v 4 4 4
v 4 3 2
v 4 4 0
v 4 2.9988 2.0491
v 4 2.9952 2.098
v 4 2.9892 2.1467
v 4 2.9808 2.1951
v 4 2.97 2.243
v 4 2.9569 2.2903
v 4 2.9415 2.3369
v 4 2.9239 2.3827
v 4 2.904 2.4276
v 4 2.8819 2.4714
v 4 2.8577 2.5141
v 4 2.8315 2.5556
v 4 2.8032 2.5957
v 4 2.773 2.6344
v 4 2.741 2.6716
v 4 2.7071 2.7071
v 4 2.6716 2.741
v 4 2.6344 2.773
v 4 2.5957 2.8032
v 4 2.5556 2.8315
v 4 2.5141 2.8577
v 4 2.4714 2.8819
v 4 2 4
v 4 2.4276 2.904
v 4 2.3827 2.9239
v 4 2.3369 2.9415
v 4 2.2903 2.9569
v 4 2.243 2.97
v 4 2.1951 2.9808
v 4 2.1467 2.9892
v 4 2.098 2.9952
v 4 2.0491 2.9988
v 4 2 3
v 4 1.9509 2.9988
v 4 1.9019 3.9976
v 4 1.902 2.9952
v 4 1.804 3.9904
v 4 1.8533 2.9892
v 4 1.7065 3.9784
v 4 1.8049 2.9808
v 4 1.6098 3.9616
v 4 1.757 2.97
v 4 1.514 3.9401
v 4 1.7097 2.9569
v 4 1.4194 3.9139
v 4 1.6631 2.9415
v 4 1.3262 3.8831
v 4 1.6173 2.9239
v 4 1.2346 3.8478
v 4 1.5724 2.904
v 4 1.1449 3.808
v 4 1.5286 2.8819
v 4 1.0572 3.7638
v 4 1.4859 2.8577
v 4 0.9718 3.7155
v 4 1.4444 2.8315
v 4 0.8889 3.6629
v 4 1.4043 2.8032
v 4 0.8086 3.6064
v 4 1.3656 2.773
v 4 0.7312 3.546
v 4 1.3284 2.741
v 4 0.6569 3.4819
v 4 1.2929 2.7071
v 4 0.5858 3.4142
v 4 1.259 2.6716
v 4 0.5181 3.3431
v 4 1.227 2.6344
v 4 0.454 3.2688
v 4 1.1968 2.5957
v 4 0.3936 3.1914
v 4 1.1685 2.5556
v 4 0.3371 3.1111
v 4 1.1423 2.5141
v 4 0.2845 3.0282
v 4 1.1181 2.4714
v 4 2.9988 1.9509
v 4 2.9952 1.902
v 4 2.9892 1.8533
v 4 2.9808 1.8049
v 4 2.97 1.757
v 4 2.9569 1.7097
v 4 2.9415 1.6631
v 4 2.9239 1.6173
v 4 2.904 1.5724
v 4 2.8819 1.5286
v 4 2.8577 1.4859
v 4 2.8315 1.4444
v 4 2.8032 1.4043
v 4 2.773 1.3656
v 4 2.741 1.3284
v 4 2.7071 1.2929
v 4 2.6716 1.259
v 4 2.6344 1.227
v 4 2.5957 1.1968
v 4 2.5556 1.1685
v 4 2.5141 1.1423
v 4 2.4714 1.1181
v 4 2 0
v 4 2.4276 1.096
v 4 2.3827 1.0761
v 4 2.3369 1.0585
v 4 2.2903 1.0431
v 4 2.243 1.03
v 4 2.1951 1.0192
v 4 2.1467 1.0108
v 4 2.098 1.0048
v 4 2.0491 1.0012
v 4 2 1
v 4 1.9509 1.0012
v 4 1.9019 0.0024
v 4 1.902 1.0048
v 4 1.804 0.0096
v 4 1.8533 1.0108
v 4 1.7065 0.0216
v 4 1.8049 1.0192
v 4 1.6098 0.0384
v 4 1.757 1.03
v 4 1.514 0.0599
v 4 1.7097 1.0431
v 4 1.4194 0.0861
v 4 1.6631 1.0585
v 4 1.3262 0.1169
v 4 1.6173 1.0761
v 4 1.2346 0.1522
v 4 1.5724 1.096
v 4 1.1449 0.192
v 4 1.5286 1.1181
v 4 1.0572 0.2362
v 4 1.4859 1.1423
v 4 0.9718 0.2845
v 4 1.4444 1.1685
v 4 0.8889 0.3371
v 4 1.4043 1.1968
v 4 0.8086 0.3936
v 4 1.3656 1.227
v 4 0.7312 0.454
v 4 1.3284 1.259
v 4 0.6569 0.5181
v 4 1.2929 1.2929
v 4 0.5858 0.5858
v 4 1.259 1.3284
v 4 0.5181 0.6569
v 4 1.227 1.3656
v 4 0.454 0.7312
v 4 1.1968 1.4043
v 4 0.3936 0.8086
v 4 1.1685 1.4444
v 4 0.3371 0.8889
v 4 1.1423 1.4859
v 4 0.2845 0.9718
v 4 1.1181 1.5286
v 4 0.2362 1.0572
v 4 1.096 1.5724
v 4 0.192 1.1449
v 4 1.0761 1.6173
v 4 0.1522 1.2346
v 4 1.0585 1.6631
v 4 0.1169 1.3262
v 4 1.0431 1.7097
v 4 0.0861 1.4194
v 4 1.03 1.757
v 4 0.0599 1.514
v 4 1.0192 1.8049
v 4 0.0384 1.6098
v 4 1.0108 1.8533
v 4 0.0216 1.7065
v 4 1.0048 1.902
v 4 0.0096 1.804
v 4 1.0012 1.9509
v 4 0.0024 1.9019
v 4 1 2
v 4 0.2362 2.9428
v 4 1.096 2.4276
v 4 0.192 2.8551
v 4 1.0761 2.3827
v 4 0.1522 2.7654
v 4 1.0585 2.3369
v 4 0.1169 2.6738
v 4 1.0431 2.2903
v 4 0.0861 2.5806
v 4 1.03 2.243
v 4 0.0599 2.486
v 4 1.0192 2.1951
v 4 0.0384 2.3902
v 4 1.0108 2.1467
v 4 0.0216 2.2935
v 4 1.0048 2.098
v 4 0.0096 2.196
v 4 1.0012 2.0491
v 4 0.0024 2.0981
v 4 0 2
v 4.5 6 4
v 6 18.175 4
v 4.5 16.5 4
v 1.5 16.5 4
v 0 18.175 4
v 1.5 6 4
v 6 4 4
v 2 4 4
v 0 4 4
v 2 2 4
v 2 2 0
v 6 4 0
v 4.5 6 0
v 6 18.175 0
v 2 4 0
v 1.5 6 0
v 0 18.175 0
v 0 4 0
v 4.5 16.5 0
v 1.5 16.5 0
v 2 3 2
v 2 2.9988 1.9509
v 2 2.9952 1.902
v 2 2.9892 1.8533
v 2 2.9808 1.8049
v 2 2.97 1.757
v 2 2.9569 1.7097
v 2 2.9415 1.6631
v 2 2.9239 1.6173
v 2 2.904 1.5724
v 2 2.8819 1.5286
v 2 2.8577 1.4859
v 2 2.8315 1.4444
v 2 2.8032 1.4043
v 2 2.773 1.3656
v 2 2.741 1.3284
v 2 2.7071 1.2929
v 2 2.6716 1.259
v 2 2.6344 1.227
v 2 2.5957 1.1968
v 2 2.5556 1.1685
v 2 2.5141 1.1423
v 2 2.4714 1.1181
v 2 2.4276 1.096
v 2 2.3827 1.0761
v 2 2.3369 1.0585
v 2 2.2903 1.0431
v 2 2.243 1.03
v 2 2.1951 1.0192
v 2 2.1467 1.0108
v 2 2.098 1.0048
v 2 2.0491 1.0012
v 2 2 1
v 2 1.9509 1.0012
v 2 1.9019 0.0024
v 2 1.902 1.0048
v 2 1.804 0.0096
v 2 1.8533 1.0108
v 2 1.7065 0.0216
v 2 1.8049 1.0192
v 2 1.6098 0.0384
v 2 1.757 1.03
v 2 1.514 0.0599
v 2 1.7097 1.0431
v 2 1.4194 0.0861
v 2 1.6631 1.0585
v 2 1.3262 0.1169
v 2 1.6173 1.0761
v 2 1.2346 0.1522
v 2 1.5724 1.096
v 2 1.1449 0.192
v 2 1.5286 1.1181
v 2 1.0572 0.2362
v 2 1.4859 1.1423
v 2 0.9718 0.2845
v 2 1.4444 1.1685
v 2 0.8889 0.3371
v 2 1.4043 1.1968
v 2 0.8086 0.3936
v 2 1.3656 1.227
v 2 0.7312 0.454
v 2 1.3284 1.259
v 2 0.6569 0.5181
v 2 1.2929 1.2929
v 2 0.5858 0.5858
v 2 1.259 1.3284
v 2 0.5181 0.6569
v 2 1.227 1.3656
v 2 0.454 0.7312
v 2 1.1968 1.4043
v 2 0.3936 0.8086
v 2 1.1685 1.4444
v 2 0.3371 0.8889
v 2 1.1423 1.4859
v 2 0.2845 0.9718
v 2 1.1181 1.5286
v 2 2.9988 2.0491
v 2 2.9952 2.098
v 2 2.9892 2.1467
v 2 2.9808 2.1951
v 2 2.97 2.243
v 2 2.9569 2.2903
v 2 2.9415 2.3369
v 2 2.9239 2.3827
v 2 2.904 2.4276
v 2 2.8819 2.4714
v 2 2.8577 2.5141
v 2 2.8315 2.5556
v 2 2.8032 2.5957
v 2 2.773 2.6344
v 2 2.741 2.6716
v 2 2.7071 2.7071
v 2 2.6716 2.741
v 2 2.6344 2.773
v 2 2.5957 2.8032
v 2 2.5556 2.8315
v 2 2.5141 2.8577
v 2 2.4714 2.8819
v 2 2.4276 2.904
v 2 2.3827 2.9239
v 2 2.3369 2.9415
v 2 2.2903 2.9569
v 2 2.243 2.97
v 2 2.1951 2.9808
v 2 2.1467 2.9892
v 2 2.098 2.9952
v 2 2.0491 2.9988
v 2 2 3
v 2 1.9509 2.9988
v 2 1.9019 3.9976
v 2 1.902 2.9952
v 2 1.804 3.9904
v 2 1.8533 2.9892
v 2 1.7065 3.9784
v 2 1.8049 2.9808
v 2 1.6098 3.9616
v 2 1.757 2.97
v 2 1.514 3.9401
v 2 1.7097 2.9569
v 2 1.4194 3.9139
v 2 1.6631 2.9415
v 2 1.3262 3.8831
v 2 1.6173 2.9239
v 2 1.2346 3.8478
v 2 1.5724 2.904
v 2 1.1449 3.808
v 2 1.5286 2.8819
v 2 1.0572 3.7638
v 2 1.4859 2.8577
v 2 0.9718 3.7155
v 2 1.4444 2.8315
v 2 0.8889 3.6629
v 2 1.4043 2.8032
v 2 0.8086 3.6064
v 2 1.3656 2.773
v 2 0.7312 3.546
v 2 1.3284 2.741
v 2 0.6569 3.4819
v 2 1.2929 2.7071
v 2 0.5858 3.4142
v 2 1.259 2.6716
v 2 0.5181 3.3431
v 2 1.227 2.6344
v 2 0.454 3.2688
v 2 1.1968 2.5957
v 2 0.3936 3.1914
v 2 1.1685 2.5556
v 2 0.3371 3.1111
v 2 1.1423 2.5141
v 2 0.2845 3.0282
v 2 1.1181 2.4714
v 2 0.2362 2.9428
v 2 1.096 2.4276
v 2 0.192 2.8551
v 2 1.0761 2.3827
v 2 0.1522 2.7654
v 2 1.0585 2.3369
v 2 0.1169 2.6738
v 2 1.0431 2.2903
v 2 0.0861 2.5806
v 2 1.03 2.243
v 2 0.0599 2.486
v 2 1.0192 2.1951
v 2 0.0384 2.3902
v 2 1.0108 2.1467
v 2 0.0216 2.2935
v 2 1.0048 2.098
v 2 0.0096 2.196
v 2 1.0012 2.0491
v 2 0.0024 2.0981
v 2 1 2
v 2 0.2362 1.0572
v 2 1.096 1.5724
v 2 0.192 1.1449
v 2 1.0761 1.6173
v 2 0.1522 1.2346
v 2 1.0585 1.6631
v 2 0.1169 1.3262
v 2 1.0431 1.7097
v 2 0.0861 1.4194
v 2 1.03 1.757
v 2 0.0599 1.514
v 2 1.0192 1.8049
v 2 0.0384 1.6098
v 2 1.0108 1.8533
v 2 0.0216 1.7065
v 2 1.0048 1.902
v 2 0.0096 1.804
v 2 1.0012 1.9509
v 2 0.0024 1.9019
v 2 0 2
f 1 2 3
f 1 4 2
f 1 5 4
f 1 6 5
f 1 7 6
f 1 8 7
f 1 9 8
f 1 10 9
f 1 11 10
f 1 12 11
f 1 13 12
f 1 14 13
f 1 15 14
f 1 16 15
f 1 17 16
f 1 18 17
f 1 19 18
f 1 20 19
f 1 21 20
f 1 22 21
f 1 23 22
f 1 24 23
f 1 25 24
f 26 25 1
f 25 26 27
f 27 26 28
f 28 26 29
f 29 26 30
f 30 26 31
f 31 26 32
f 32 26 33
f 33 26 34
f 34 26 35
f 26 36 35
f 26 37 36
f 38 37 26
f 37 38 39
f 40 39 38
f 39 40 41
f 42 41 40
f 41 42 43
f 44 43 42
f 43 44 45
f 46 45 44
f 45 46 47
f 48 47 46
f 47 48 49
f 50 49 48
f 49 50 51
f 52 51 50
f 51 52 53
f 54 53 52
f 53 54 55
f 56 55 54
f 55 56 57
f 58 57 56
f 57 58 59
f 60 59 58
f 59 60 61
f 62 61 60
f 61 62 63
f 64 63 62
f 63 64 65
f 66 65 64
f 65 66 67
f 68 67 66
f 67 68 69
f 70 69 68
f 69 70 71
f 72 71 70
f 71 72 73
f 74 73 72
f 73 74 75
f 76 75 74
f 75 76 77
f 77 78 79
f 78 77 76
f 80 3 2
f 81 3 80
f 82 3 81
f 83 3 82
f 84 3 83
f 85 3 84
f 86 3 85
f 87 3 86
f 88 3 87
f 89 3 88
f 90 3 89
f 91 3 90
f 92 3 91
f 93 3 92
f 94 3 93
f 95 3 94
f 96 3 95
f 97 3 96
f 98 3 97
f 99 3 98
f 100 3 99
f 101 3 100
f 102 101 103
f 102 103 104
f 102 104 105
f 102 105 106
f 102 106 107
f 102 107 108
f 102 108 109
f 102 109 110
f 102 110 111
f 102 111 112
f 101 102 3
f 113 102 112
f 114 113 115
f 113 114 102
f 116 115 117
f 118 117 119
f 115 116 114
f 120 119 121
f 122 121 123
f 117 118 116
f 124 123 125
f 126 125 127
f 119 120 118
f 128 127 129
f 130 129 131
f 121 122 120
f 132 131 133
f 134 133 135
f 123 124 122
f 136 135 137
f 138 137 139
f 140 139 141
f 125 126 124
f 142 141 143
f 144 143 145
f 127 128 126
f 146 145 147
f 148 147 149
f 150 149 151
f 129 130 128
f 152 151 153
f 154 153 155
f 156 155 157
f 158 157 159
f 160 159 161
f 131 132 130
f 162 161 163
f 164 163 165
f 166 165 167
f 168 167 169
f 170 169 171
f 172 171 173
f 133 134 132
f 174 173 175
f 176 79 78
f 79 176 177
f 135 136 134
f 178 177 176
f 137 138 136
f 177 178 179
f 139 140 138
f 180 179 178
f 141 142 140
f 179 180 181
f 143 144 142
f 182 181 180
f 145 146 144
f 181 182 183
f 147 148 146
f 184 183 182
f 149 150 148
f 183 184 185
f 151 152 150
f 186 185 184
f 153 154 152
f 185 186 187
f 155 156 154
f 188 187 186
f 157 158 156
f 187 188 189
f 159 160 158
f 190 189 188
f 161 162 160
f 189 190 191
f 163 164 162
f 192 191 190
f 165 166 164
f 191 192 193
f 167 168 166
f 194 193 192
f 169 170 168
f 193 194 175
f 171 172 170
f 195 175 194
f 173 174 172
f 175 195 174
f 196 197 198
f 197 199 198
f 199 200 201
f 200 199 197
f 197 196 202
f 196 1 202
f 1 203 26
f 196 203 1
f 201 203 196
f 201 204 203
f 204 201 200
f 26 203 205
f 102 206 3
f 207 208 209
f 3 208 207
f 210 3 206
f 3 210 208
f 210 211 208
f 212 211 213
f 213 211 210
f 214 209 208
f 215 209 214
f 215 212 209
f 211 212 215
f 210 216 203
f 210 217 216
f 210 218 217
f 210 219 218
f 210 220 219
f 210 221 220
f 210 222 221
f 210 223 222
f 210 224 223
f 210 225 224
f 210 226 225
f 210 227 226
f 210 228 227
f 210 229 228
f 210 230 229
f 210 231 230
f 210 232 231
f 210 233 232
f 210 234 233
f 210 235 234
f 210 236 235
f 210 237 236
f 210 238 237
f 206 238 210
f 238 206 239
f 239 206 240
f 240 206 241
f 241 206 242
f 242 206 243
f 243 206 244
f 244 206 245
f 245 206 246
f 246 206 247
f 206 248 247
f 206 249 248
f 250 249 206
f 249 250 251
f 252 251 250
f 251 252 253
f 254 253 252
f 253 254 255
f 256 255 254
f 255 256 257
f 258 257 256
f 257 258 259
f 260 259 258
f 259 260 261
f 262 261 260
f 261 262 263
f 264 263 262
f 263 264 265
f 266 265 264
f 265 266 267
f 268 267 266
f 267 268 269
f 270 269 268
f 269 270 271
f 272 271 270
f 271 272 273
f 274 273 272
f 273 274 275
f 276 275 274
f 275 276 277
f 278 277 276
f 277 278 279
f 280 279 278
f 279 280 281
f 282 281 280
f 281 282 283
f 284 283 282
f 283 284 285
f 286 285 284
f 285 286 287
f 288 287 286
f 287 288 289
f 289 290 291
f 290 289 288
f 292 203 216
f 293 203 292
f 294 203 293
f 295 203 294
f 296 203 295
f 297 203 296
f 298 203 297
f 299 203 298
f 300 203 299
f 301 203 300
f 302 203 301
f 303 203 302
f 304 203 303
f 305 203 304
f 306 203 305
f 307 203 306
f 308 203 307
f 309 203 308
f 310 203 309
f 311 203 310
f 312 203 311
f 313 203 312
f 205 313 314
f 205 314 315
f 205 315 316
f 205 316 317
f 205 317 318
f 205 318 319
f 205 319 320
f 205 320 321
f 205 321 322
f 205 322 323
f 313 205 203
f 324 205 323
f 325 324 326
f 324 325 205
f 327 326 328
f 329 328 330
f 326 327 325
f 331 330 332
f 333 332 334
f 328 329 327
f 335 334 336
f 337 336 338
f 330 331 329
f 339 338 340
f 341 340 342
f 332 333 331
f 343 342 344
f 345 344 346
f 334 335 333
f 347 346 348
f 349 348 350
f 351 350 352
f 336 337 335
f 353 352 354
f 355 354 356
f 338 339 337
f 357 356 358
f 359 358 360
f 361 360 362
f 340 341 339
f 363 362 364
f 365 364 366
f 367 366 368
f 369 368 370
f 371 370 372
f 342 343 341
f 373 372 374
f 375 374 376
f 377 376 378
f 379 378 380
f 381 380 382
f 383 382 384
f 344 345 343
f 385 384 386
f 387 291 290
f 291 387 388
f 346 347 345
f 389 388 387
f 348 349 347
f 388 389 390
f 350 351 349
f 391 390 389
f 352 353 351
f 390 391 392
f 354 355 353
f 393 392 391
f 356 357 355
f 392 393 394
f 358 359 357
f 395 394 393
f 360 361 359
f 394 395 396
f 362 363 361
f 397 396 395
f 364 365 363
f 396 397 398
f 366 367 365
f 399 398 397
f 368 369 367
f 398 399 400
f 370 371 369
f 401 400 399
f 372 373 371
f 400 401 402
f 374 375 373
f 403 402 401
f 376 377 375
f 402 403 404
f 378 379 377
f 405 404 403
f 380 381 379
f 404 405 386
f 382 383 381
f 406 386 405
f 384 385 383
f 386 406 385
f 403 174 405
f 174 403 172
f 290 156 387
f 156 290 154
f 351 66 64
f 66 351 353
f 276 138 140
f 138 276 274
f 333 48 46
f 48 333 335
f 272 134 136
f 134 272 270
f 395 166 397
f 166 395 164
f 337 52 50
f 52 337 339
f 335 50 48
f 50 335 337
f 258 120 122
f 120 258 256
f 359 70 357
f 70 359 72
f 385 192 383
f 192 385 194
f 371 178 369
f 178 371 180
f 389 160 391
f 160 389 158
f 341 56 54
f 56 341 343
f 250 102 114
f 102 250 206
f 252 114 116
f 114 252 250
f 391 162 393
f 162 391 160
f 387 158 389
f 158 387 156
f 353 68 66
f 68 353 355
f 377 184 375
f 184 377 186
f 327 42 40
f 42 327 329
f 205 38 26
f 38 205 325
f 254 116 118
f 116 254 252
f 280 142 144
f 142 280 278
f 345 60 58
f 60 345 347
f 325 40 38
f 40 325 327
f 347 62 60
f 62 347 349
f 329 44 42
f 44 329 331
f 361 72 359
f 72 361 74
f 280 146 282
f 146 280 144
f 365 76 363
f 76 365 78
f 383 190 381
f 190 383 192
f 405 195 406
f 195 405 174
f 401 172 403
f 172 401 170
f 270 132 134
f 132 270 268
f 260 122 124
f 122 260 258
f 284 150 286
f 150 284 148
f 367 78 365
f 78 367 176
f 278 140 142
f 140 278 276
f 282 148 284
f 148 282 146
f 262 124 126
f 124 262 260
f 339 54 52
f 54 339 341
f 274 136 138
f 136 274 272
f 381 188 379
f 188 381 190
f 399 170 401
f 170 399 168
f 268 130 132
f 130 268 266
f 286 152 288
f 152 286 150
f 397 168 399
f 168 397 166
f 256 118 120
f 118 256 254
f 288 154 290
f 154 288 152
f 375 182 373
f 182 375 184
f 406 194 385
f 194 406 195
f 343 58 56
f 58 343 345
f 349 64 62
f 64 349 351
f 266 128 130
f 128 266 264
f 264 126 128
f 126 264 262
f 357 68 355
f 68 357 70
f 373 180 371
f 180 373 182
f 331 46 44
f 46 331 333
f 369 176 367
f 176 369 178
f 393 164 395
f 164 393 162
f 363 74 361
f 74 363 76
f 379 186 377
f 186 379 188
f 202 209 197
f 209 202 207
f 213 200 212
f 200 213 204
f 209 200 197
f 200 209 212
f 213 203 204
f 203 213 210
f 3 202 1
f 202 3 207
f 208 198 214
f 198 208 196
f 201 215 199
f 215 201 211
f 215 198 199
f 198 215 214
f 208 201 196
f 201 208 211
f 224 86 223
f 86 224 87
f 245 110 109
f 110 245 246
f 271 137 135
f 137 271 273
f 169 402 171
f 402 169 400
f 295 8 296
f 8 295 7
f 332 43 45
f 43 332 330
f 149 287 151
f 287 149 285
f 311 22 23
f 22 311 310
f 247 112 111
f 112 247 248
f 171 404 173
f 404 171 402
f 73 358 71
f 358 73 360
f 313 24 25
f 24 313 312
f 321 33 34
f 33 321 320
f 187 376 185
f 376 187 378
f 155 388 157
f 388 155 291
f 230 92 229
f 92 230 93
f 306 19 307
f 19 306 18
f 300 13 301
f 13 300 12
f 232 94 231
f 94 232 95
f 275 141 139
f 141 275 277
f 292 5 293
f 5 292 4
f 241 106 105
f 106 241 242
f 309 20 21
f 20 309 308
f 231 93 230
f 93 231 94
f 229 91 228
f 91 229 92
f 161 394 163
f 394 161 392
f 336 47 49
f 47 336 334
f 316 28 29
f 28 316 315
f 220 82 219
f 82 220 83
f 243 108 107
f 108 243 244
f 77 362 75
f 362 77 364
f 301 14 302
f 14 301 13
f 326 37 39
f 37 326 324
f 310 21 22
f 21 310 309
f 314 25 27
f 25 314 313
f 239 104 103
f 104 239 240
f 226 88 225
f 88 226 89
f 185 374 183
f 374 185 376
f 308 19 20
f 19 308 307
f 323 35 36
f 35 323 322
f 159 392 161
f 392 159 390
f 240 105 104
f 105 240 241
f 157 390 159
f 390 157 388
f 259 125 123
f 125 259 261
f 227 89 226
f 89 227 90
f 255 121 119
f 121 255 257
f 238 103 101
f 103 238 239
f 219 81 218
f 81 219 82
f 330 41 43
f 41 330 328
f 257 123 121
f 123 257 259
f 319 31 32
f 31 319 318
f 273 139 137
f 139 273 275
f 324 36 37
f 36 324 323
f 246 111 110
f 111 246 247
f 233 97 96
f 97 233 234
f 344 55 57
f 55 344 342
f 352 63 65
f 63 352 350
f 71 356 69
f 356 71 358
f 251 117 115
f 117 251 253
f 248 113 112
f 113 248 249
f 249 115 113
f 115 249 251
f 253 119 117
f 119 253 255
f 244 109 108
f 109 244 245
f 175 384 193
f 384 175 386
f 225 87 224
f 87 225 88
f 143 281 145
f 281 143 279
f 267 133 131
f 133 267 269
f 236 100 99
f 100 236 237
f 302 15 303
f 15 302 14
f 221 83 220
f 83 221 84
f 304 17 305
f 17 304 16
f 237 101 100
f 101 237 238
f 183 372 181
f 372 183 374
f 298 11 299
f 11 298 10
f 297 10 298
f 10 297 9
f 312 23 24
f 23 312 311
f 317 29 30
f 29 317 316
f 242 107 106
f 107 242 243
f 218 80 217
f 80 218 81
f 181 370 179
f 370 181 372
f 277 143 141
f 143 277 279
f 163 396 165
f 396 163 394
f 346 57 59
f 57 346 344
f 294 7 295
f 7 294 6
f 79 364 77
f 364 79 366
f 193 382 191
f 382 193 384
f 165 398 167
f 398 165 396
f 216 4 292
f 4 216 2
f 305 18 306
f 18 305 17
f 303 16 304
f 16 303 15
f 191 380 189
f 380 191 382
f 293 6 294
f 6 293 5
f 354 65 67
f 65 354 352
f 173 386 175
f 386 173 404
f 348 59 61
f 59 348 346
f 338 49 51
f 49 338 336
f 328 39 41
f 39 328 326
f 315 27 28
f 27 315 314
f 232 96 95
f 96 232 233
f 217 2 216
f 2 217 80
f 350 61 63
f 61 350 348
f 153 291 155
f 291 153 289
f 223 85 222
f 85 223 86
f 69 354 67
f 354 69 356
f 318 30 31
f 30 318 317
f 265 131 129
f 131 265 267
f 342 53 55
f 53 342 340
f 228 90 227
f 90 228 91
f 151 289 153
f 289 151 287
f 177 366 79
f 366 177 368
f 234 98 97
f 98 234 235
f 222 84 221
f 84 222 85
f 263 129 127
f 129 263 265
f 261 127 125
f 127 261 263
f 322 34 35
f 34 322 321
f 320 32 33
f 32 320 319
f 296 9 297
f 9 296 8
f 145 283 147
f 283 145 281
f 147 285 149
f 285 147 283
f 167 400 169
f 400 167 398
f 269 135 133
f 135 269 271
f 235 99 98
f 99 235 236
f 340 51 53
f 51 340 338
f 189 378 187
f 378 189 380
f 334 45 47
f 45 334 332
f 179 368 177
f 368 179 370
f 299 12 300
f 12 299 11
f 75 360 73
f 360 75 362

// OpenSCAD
// file: BusinessCardBoxVars.scad
$fn=128;
Wall=3;
InnerW_X=45;
InnerD_Y=30;
InnerH_Z=40;

DW=Wall*2;
HightZ=InnerH_Z+DW;
LengthX=InnerW_X+DW;
WidthY=InnerD_Y+DW;

TW=Wall*3;
HW=Wall/2;
HingePinDia=2;
NumHinge=3;
HL=LengthX/2;
Buff=1;
DB=Buff*2;

FrontHingeLatch = 2;
FrontHingeW = FrontHingeLatch*3;
HFH = FrontHingeW/2;
HFHL = FrontHingeLatch/2;
LatchH=HingePinDia*2;

LockDia = 3;
DLD = LockDia+4;
// main file
include <BusinessCardBoxVars.scad>;
FrontLatchX = FrontHingeLatch*1.5;
PegLen=DLD*1.5;
LatchLen=PegLen*1.35;

difference()
{
  union()
  {
    translate([(FrontHingeW/2)-(FrontHingeLatch/2),FrontHingeLatch,0]) cube([FrontHingeLatch,DW,LatchH]);
    translate([2,HingePinDia,HingePinDia]) rotate([0,90,0]) cylinder(d=LatchH,h=FrontHingeLatch);
    translate([0,LatchH,0]) cube([FrontHingeW,LatchLen,LatchH]);
  }
  translate([(FrontHingeW/2)-(FrontLatchX/2),DW,-Buff]) cube([FrontLatchX,PegLen,LatchH+DB]);
  translate([-Buff,HingePinDia,HingePinDia]) rotate([0,90,0]) cylinder(d=HingePinDia,h=DW);
}
